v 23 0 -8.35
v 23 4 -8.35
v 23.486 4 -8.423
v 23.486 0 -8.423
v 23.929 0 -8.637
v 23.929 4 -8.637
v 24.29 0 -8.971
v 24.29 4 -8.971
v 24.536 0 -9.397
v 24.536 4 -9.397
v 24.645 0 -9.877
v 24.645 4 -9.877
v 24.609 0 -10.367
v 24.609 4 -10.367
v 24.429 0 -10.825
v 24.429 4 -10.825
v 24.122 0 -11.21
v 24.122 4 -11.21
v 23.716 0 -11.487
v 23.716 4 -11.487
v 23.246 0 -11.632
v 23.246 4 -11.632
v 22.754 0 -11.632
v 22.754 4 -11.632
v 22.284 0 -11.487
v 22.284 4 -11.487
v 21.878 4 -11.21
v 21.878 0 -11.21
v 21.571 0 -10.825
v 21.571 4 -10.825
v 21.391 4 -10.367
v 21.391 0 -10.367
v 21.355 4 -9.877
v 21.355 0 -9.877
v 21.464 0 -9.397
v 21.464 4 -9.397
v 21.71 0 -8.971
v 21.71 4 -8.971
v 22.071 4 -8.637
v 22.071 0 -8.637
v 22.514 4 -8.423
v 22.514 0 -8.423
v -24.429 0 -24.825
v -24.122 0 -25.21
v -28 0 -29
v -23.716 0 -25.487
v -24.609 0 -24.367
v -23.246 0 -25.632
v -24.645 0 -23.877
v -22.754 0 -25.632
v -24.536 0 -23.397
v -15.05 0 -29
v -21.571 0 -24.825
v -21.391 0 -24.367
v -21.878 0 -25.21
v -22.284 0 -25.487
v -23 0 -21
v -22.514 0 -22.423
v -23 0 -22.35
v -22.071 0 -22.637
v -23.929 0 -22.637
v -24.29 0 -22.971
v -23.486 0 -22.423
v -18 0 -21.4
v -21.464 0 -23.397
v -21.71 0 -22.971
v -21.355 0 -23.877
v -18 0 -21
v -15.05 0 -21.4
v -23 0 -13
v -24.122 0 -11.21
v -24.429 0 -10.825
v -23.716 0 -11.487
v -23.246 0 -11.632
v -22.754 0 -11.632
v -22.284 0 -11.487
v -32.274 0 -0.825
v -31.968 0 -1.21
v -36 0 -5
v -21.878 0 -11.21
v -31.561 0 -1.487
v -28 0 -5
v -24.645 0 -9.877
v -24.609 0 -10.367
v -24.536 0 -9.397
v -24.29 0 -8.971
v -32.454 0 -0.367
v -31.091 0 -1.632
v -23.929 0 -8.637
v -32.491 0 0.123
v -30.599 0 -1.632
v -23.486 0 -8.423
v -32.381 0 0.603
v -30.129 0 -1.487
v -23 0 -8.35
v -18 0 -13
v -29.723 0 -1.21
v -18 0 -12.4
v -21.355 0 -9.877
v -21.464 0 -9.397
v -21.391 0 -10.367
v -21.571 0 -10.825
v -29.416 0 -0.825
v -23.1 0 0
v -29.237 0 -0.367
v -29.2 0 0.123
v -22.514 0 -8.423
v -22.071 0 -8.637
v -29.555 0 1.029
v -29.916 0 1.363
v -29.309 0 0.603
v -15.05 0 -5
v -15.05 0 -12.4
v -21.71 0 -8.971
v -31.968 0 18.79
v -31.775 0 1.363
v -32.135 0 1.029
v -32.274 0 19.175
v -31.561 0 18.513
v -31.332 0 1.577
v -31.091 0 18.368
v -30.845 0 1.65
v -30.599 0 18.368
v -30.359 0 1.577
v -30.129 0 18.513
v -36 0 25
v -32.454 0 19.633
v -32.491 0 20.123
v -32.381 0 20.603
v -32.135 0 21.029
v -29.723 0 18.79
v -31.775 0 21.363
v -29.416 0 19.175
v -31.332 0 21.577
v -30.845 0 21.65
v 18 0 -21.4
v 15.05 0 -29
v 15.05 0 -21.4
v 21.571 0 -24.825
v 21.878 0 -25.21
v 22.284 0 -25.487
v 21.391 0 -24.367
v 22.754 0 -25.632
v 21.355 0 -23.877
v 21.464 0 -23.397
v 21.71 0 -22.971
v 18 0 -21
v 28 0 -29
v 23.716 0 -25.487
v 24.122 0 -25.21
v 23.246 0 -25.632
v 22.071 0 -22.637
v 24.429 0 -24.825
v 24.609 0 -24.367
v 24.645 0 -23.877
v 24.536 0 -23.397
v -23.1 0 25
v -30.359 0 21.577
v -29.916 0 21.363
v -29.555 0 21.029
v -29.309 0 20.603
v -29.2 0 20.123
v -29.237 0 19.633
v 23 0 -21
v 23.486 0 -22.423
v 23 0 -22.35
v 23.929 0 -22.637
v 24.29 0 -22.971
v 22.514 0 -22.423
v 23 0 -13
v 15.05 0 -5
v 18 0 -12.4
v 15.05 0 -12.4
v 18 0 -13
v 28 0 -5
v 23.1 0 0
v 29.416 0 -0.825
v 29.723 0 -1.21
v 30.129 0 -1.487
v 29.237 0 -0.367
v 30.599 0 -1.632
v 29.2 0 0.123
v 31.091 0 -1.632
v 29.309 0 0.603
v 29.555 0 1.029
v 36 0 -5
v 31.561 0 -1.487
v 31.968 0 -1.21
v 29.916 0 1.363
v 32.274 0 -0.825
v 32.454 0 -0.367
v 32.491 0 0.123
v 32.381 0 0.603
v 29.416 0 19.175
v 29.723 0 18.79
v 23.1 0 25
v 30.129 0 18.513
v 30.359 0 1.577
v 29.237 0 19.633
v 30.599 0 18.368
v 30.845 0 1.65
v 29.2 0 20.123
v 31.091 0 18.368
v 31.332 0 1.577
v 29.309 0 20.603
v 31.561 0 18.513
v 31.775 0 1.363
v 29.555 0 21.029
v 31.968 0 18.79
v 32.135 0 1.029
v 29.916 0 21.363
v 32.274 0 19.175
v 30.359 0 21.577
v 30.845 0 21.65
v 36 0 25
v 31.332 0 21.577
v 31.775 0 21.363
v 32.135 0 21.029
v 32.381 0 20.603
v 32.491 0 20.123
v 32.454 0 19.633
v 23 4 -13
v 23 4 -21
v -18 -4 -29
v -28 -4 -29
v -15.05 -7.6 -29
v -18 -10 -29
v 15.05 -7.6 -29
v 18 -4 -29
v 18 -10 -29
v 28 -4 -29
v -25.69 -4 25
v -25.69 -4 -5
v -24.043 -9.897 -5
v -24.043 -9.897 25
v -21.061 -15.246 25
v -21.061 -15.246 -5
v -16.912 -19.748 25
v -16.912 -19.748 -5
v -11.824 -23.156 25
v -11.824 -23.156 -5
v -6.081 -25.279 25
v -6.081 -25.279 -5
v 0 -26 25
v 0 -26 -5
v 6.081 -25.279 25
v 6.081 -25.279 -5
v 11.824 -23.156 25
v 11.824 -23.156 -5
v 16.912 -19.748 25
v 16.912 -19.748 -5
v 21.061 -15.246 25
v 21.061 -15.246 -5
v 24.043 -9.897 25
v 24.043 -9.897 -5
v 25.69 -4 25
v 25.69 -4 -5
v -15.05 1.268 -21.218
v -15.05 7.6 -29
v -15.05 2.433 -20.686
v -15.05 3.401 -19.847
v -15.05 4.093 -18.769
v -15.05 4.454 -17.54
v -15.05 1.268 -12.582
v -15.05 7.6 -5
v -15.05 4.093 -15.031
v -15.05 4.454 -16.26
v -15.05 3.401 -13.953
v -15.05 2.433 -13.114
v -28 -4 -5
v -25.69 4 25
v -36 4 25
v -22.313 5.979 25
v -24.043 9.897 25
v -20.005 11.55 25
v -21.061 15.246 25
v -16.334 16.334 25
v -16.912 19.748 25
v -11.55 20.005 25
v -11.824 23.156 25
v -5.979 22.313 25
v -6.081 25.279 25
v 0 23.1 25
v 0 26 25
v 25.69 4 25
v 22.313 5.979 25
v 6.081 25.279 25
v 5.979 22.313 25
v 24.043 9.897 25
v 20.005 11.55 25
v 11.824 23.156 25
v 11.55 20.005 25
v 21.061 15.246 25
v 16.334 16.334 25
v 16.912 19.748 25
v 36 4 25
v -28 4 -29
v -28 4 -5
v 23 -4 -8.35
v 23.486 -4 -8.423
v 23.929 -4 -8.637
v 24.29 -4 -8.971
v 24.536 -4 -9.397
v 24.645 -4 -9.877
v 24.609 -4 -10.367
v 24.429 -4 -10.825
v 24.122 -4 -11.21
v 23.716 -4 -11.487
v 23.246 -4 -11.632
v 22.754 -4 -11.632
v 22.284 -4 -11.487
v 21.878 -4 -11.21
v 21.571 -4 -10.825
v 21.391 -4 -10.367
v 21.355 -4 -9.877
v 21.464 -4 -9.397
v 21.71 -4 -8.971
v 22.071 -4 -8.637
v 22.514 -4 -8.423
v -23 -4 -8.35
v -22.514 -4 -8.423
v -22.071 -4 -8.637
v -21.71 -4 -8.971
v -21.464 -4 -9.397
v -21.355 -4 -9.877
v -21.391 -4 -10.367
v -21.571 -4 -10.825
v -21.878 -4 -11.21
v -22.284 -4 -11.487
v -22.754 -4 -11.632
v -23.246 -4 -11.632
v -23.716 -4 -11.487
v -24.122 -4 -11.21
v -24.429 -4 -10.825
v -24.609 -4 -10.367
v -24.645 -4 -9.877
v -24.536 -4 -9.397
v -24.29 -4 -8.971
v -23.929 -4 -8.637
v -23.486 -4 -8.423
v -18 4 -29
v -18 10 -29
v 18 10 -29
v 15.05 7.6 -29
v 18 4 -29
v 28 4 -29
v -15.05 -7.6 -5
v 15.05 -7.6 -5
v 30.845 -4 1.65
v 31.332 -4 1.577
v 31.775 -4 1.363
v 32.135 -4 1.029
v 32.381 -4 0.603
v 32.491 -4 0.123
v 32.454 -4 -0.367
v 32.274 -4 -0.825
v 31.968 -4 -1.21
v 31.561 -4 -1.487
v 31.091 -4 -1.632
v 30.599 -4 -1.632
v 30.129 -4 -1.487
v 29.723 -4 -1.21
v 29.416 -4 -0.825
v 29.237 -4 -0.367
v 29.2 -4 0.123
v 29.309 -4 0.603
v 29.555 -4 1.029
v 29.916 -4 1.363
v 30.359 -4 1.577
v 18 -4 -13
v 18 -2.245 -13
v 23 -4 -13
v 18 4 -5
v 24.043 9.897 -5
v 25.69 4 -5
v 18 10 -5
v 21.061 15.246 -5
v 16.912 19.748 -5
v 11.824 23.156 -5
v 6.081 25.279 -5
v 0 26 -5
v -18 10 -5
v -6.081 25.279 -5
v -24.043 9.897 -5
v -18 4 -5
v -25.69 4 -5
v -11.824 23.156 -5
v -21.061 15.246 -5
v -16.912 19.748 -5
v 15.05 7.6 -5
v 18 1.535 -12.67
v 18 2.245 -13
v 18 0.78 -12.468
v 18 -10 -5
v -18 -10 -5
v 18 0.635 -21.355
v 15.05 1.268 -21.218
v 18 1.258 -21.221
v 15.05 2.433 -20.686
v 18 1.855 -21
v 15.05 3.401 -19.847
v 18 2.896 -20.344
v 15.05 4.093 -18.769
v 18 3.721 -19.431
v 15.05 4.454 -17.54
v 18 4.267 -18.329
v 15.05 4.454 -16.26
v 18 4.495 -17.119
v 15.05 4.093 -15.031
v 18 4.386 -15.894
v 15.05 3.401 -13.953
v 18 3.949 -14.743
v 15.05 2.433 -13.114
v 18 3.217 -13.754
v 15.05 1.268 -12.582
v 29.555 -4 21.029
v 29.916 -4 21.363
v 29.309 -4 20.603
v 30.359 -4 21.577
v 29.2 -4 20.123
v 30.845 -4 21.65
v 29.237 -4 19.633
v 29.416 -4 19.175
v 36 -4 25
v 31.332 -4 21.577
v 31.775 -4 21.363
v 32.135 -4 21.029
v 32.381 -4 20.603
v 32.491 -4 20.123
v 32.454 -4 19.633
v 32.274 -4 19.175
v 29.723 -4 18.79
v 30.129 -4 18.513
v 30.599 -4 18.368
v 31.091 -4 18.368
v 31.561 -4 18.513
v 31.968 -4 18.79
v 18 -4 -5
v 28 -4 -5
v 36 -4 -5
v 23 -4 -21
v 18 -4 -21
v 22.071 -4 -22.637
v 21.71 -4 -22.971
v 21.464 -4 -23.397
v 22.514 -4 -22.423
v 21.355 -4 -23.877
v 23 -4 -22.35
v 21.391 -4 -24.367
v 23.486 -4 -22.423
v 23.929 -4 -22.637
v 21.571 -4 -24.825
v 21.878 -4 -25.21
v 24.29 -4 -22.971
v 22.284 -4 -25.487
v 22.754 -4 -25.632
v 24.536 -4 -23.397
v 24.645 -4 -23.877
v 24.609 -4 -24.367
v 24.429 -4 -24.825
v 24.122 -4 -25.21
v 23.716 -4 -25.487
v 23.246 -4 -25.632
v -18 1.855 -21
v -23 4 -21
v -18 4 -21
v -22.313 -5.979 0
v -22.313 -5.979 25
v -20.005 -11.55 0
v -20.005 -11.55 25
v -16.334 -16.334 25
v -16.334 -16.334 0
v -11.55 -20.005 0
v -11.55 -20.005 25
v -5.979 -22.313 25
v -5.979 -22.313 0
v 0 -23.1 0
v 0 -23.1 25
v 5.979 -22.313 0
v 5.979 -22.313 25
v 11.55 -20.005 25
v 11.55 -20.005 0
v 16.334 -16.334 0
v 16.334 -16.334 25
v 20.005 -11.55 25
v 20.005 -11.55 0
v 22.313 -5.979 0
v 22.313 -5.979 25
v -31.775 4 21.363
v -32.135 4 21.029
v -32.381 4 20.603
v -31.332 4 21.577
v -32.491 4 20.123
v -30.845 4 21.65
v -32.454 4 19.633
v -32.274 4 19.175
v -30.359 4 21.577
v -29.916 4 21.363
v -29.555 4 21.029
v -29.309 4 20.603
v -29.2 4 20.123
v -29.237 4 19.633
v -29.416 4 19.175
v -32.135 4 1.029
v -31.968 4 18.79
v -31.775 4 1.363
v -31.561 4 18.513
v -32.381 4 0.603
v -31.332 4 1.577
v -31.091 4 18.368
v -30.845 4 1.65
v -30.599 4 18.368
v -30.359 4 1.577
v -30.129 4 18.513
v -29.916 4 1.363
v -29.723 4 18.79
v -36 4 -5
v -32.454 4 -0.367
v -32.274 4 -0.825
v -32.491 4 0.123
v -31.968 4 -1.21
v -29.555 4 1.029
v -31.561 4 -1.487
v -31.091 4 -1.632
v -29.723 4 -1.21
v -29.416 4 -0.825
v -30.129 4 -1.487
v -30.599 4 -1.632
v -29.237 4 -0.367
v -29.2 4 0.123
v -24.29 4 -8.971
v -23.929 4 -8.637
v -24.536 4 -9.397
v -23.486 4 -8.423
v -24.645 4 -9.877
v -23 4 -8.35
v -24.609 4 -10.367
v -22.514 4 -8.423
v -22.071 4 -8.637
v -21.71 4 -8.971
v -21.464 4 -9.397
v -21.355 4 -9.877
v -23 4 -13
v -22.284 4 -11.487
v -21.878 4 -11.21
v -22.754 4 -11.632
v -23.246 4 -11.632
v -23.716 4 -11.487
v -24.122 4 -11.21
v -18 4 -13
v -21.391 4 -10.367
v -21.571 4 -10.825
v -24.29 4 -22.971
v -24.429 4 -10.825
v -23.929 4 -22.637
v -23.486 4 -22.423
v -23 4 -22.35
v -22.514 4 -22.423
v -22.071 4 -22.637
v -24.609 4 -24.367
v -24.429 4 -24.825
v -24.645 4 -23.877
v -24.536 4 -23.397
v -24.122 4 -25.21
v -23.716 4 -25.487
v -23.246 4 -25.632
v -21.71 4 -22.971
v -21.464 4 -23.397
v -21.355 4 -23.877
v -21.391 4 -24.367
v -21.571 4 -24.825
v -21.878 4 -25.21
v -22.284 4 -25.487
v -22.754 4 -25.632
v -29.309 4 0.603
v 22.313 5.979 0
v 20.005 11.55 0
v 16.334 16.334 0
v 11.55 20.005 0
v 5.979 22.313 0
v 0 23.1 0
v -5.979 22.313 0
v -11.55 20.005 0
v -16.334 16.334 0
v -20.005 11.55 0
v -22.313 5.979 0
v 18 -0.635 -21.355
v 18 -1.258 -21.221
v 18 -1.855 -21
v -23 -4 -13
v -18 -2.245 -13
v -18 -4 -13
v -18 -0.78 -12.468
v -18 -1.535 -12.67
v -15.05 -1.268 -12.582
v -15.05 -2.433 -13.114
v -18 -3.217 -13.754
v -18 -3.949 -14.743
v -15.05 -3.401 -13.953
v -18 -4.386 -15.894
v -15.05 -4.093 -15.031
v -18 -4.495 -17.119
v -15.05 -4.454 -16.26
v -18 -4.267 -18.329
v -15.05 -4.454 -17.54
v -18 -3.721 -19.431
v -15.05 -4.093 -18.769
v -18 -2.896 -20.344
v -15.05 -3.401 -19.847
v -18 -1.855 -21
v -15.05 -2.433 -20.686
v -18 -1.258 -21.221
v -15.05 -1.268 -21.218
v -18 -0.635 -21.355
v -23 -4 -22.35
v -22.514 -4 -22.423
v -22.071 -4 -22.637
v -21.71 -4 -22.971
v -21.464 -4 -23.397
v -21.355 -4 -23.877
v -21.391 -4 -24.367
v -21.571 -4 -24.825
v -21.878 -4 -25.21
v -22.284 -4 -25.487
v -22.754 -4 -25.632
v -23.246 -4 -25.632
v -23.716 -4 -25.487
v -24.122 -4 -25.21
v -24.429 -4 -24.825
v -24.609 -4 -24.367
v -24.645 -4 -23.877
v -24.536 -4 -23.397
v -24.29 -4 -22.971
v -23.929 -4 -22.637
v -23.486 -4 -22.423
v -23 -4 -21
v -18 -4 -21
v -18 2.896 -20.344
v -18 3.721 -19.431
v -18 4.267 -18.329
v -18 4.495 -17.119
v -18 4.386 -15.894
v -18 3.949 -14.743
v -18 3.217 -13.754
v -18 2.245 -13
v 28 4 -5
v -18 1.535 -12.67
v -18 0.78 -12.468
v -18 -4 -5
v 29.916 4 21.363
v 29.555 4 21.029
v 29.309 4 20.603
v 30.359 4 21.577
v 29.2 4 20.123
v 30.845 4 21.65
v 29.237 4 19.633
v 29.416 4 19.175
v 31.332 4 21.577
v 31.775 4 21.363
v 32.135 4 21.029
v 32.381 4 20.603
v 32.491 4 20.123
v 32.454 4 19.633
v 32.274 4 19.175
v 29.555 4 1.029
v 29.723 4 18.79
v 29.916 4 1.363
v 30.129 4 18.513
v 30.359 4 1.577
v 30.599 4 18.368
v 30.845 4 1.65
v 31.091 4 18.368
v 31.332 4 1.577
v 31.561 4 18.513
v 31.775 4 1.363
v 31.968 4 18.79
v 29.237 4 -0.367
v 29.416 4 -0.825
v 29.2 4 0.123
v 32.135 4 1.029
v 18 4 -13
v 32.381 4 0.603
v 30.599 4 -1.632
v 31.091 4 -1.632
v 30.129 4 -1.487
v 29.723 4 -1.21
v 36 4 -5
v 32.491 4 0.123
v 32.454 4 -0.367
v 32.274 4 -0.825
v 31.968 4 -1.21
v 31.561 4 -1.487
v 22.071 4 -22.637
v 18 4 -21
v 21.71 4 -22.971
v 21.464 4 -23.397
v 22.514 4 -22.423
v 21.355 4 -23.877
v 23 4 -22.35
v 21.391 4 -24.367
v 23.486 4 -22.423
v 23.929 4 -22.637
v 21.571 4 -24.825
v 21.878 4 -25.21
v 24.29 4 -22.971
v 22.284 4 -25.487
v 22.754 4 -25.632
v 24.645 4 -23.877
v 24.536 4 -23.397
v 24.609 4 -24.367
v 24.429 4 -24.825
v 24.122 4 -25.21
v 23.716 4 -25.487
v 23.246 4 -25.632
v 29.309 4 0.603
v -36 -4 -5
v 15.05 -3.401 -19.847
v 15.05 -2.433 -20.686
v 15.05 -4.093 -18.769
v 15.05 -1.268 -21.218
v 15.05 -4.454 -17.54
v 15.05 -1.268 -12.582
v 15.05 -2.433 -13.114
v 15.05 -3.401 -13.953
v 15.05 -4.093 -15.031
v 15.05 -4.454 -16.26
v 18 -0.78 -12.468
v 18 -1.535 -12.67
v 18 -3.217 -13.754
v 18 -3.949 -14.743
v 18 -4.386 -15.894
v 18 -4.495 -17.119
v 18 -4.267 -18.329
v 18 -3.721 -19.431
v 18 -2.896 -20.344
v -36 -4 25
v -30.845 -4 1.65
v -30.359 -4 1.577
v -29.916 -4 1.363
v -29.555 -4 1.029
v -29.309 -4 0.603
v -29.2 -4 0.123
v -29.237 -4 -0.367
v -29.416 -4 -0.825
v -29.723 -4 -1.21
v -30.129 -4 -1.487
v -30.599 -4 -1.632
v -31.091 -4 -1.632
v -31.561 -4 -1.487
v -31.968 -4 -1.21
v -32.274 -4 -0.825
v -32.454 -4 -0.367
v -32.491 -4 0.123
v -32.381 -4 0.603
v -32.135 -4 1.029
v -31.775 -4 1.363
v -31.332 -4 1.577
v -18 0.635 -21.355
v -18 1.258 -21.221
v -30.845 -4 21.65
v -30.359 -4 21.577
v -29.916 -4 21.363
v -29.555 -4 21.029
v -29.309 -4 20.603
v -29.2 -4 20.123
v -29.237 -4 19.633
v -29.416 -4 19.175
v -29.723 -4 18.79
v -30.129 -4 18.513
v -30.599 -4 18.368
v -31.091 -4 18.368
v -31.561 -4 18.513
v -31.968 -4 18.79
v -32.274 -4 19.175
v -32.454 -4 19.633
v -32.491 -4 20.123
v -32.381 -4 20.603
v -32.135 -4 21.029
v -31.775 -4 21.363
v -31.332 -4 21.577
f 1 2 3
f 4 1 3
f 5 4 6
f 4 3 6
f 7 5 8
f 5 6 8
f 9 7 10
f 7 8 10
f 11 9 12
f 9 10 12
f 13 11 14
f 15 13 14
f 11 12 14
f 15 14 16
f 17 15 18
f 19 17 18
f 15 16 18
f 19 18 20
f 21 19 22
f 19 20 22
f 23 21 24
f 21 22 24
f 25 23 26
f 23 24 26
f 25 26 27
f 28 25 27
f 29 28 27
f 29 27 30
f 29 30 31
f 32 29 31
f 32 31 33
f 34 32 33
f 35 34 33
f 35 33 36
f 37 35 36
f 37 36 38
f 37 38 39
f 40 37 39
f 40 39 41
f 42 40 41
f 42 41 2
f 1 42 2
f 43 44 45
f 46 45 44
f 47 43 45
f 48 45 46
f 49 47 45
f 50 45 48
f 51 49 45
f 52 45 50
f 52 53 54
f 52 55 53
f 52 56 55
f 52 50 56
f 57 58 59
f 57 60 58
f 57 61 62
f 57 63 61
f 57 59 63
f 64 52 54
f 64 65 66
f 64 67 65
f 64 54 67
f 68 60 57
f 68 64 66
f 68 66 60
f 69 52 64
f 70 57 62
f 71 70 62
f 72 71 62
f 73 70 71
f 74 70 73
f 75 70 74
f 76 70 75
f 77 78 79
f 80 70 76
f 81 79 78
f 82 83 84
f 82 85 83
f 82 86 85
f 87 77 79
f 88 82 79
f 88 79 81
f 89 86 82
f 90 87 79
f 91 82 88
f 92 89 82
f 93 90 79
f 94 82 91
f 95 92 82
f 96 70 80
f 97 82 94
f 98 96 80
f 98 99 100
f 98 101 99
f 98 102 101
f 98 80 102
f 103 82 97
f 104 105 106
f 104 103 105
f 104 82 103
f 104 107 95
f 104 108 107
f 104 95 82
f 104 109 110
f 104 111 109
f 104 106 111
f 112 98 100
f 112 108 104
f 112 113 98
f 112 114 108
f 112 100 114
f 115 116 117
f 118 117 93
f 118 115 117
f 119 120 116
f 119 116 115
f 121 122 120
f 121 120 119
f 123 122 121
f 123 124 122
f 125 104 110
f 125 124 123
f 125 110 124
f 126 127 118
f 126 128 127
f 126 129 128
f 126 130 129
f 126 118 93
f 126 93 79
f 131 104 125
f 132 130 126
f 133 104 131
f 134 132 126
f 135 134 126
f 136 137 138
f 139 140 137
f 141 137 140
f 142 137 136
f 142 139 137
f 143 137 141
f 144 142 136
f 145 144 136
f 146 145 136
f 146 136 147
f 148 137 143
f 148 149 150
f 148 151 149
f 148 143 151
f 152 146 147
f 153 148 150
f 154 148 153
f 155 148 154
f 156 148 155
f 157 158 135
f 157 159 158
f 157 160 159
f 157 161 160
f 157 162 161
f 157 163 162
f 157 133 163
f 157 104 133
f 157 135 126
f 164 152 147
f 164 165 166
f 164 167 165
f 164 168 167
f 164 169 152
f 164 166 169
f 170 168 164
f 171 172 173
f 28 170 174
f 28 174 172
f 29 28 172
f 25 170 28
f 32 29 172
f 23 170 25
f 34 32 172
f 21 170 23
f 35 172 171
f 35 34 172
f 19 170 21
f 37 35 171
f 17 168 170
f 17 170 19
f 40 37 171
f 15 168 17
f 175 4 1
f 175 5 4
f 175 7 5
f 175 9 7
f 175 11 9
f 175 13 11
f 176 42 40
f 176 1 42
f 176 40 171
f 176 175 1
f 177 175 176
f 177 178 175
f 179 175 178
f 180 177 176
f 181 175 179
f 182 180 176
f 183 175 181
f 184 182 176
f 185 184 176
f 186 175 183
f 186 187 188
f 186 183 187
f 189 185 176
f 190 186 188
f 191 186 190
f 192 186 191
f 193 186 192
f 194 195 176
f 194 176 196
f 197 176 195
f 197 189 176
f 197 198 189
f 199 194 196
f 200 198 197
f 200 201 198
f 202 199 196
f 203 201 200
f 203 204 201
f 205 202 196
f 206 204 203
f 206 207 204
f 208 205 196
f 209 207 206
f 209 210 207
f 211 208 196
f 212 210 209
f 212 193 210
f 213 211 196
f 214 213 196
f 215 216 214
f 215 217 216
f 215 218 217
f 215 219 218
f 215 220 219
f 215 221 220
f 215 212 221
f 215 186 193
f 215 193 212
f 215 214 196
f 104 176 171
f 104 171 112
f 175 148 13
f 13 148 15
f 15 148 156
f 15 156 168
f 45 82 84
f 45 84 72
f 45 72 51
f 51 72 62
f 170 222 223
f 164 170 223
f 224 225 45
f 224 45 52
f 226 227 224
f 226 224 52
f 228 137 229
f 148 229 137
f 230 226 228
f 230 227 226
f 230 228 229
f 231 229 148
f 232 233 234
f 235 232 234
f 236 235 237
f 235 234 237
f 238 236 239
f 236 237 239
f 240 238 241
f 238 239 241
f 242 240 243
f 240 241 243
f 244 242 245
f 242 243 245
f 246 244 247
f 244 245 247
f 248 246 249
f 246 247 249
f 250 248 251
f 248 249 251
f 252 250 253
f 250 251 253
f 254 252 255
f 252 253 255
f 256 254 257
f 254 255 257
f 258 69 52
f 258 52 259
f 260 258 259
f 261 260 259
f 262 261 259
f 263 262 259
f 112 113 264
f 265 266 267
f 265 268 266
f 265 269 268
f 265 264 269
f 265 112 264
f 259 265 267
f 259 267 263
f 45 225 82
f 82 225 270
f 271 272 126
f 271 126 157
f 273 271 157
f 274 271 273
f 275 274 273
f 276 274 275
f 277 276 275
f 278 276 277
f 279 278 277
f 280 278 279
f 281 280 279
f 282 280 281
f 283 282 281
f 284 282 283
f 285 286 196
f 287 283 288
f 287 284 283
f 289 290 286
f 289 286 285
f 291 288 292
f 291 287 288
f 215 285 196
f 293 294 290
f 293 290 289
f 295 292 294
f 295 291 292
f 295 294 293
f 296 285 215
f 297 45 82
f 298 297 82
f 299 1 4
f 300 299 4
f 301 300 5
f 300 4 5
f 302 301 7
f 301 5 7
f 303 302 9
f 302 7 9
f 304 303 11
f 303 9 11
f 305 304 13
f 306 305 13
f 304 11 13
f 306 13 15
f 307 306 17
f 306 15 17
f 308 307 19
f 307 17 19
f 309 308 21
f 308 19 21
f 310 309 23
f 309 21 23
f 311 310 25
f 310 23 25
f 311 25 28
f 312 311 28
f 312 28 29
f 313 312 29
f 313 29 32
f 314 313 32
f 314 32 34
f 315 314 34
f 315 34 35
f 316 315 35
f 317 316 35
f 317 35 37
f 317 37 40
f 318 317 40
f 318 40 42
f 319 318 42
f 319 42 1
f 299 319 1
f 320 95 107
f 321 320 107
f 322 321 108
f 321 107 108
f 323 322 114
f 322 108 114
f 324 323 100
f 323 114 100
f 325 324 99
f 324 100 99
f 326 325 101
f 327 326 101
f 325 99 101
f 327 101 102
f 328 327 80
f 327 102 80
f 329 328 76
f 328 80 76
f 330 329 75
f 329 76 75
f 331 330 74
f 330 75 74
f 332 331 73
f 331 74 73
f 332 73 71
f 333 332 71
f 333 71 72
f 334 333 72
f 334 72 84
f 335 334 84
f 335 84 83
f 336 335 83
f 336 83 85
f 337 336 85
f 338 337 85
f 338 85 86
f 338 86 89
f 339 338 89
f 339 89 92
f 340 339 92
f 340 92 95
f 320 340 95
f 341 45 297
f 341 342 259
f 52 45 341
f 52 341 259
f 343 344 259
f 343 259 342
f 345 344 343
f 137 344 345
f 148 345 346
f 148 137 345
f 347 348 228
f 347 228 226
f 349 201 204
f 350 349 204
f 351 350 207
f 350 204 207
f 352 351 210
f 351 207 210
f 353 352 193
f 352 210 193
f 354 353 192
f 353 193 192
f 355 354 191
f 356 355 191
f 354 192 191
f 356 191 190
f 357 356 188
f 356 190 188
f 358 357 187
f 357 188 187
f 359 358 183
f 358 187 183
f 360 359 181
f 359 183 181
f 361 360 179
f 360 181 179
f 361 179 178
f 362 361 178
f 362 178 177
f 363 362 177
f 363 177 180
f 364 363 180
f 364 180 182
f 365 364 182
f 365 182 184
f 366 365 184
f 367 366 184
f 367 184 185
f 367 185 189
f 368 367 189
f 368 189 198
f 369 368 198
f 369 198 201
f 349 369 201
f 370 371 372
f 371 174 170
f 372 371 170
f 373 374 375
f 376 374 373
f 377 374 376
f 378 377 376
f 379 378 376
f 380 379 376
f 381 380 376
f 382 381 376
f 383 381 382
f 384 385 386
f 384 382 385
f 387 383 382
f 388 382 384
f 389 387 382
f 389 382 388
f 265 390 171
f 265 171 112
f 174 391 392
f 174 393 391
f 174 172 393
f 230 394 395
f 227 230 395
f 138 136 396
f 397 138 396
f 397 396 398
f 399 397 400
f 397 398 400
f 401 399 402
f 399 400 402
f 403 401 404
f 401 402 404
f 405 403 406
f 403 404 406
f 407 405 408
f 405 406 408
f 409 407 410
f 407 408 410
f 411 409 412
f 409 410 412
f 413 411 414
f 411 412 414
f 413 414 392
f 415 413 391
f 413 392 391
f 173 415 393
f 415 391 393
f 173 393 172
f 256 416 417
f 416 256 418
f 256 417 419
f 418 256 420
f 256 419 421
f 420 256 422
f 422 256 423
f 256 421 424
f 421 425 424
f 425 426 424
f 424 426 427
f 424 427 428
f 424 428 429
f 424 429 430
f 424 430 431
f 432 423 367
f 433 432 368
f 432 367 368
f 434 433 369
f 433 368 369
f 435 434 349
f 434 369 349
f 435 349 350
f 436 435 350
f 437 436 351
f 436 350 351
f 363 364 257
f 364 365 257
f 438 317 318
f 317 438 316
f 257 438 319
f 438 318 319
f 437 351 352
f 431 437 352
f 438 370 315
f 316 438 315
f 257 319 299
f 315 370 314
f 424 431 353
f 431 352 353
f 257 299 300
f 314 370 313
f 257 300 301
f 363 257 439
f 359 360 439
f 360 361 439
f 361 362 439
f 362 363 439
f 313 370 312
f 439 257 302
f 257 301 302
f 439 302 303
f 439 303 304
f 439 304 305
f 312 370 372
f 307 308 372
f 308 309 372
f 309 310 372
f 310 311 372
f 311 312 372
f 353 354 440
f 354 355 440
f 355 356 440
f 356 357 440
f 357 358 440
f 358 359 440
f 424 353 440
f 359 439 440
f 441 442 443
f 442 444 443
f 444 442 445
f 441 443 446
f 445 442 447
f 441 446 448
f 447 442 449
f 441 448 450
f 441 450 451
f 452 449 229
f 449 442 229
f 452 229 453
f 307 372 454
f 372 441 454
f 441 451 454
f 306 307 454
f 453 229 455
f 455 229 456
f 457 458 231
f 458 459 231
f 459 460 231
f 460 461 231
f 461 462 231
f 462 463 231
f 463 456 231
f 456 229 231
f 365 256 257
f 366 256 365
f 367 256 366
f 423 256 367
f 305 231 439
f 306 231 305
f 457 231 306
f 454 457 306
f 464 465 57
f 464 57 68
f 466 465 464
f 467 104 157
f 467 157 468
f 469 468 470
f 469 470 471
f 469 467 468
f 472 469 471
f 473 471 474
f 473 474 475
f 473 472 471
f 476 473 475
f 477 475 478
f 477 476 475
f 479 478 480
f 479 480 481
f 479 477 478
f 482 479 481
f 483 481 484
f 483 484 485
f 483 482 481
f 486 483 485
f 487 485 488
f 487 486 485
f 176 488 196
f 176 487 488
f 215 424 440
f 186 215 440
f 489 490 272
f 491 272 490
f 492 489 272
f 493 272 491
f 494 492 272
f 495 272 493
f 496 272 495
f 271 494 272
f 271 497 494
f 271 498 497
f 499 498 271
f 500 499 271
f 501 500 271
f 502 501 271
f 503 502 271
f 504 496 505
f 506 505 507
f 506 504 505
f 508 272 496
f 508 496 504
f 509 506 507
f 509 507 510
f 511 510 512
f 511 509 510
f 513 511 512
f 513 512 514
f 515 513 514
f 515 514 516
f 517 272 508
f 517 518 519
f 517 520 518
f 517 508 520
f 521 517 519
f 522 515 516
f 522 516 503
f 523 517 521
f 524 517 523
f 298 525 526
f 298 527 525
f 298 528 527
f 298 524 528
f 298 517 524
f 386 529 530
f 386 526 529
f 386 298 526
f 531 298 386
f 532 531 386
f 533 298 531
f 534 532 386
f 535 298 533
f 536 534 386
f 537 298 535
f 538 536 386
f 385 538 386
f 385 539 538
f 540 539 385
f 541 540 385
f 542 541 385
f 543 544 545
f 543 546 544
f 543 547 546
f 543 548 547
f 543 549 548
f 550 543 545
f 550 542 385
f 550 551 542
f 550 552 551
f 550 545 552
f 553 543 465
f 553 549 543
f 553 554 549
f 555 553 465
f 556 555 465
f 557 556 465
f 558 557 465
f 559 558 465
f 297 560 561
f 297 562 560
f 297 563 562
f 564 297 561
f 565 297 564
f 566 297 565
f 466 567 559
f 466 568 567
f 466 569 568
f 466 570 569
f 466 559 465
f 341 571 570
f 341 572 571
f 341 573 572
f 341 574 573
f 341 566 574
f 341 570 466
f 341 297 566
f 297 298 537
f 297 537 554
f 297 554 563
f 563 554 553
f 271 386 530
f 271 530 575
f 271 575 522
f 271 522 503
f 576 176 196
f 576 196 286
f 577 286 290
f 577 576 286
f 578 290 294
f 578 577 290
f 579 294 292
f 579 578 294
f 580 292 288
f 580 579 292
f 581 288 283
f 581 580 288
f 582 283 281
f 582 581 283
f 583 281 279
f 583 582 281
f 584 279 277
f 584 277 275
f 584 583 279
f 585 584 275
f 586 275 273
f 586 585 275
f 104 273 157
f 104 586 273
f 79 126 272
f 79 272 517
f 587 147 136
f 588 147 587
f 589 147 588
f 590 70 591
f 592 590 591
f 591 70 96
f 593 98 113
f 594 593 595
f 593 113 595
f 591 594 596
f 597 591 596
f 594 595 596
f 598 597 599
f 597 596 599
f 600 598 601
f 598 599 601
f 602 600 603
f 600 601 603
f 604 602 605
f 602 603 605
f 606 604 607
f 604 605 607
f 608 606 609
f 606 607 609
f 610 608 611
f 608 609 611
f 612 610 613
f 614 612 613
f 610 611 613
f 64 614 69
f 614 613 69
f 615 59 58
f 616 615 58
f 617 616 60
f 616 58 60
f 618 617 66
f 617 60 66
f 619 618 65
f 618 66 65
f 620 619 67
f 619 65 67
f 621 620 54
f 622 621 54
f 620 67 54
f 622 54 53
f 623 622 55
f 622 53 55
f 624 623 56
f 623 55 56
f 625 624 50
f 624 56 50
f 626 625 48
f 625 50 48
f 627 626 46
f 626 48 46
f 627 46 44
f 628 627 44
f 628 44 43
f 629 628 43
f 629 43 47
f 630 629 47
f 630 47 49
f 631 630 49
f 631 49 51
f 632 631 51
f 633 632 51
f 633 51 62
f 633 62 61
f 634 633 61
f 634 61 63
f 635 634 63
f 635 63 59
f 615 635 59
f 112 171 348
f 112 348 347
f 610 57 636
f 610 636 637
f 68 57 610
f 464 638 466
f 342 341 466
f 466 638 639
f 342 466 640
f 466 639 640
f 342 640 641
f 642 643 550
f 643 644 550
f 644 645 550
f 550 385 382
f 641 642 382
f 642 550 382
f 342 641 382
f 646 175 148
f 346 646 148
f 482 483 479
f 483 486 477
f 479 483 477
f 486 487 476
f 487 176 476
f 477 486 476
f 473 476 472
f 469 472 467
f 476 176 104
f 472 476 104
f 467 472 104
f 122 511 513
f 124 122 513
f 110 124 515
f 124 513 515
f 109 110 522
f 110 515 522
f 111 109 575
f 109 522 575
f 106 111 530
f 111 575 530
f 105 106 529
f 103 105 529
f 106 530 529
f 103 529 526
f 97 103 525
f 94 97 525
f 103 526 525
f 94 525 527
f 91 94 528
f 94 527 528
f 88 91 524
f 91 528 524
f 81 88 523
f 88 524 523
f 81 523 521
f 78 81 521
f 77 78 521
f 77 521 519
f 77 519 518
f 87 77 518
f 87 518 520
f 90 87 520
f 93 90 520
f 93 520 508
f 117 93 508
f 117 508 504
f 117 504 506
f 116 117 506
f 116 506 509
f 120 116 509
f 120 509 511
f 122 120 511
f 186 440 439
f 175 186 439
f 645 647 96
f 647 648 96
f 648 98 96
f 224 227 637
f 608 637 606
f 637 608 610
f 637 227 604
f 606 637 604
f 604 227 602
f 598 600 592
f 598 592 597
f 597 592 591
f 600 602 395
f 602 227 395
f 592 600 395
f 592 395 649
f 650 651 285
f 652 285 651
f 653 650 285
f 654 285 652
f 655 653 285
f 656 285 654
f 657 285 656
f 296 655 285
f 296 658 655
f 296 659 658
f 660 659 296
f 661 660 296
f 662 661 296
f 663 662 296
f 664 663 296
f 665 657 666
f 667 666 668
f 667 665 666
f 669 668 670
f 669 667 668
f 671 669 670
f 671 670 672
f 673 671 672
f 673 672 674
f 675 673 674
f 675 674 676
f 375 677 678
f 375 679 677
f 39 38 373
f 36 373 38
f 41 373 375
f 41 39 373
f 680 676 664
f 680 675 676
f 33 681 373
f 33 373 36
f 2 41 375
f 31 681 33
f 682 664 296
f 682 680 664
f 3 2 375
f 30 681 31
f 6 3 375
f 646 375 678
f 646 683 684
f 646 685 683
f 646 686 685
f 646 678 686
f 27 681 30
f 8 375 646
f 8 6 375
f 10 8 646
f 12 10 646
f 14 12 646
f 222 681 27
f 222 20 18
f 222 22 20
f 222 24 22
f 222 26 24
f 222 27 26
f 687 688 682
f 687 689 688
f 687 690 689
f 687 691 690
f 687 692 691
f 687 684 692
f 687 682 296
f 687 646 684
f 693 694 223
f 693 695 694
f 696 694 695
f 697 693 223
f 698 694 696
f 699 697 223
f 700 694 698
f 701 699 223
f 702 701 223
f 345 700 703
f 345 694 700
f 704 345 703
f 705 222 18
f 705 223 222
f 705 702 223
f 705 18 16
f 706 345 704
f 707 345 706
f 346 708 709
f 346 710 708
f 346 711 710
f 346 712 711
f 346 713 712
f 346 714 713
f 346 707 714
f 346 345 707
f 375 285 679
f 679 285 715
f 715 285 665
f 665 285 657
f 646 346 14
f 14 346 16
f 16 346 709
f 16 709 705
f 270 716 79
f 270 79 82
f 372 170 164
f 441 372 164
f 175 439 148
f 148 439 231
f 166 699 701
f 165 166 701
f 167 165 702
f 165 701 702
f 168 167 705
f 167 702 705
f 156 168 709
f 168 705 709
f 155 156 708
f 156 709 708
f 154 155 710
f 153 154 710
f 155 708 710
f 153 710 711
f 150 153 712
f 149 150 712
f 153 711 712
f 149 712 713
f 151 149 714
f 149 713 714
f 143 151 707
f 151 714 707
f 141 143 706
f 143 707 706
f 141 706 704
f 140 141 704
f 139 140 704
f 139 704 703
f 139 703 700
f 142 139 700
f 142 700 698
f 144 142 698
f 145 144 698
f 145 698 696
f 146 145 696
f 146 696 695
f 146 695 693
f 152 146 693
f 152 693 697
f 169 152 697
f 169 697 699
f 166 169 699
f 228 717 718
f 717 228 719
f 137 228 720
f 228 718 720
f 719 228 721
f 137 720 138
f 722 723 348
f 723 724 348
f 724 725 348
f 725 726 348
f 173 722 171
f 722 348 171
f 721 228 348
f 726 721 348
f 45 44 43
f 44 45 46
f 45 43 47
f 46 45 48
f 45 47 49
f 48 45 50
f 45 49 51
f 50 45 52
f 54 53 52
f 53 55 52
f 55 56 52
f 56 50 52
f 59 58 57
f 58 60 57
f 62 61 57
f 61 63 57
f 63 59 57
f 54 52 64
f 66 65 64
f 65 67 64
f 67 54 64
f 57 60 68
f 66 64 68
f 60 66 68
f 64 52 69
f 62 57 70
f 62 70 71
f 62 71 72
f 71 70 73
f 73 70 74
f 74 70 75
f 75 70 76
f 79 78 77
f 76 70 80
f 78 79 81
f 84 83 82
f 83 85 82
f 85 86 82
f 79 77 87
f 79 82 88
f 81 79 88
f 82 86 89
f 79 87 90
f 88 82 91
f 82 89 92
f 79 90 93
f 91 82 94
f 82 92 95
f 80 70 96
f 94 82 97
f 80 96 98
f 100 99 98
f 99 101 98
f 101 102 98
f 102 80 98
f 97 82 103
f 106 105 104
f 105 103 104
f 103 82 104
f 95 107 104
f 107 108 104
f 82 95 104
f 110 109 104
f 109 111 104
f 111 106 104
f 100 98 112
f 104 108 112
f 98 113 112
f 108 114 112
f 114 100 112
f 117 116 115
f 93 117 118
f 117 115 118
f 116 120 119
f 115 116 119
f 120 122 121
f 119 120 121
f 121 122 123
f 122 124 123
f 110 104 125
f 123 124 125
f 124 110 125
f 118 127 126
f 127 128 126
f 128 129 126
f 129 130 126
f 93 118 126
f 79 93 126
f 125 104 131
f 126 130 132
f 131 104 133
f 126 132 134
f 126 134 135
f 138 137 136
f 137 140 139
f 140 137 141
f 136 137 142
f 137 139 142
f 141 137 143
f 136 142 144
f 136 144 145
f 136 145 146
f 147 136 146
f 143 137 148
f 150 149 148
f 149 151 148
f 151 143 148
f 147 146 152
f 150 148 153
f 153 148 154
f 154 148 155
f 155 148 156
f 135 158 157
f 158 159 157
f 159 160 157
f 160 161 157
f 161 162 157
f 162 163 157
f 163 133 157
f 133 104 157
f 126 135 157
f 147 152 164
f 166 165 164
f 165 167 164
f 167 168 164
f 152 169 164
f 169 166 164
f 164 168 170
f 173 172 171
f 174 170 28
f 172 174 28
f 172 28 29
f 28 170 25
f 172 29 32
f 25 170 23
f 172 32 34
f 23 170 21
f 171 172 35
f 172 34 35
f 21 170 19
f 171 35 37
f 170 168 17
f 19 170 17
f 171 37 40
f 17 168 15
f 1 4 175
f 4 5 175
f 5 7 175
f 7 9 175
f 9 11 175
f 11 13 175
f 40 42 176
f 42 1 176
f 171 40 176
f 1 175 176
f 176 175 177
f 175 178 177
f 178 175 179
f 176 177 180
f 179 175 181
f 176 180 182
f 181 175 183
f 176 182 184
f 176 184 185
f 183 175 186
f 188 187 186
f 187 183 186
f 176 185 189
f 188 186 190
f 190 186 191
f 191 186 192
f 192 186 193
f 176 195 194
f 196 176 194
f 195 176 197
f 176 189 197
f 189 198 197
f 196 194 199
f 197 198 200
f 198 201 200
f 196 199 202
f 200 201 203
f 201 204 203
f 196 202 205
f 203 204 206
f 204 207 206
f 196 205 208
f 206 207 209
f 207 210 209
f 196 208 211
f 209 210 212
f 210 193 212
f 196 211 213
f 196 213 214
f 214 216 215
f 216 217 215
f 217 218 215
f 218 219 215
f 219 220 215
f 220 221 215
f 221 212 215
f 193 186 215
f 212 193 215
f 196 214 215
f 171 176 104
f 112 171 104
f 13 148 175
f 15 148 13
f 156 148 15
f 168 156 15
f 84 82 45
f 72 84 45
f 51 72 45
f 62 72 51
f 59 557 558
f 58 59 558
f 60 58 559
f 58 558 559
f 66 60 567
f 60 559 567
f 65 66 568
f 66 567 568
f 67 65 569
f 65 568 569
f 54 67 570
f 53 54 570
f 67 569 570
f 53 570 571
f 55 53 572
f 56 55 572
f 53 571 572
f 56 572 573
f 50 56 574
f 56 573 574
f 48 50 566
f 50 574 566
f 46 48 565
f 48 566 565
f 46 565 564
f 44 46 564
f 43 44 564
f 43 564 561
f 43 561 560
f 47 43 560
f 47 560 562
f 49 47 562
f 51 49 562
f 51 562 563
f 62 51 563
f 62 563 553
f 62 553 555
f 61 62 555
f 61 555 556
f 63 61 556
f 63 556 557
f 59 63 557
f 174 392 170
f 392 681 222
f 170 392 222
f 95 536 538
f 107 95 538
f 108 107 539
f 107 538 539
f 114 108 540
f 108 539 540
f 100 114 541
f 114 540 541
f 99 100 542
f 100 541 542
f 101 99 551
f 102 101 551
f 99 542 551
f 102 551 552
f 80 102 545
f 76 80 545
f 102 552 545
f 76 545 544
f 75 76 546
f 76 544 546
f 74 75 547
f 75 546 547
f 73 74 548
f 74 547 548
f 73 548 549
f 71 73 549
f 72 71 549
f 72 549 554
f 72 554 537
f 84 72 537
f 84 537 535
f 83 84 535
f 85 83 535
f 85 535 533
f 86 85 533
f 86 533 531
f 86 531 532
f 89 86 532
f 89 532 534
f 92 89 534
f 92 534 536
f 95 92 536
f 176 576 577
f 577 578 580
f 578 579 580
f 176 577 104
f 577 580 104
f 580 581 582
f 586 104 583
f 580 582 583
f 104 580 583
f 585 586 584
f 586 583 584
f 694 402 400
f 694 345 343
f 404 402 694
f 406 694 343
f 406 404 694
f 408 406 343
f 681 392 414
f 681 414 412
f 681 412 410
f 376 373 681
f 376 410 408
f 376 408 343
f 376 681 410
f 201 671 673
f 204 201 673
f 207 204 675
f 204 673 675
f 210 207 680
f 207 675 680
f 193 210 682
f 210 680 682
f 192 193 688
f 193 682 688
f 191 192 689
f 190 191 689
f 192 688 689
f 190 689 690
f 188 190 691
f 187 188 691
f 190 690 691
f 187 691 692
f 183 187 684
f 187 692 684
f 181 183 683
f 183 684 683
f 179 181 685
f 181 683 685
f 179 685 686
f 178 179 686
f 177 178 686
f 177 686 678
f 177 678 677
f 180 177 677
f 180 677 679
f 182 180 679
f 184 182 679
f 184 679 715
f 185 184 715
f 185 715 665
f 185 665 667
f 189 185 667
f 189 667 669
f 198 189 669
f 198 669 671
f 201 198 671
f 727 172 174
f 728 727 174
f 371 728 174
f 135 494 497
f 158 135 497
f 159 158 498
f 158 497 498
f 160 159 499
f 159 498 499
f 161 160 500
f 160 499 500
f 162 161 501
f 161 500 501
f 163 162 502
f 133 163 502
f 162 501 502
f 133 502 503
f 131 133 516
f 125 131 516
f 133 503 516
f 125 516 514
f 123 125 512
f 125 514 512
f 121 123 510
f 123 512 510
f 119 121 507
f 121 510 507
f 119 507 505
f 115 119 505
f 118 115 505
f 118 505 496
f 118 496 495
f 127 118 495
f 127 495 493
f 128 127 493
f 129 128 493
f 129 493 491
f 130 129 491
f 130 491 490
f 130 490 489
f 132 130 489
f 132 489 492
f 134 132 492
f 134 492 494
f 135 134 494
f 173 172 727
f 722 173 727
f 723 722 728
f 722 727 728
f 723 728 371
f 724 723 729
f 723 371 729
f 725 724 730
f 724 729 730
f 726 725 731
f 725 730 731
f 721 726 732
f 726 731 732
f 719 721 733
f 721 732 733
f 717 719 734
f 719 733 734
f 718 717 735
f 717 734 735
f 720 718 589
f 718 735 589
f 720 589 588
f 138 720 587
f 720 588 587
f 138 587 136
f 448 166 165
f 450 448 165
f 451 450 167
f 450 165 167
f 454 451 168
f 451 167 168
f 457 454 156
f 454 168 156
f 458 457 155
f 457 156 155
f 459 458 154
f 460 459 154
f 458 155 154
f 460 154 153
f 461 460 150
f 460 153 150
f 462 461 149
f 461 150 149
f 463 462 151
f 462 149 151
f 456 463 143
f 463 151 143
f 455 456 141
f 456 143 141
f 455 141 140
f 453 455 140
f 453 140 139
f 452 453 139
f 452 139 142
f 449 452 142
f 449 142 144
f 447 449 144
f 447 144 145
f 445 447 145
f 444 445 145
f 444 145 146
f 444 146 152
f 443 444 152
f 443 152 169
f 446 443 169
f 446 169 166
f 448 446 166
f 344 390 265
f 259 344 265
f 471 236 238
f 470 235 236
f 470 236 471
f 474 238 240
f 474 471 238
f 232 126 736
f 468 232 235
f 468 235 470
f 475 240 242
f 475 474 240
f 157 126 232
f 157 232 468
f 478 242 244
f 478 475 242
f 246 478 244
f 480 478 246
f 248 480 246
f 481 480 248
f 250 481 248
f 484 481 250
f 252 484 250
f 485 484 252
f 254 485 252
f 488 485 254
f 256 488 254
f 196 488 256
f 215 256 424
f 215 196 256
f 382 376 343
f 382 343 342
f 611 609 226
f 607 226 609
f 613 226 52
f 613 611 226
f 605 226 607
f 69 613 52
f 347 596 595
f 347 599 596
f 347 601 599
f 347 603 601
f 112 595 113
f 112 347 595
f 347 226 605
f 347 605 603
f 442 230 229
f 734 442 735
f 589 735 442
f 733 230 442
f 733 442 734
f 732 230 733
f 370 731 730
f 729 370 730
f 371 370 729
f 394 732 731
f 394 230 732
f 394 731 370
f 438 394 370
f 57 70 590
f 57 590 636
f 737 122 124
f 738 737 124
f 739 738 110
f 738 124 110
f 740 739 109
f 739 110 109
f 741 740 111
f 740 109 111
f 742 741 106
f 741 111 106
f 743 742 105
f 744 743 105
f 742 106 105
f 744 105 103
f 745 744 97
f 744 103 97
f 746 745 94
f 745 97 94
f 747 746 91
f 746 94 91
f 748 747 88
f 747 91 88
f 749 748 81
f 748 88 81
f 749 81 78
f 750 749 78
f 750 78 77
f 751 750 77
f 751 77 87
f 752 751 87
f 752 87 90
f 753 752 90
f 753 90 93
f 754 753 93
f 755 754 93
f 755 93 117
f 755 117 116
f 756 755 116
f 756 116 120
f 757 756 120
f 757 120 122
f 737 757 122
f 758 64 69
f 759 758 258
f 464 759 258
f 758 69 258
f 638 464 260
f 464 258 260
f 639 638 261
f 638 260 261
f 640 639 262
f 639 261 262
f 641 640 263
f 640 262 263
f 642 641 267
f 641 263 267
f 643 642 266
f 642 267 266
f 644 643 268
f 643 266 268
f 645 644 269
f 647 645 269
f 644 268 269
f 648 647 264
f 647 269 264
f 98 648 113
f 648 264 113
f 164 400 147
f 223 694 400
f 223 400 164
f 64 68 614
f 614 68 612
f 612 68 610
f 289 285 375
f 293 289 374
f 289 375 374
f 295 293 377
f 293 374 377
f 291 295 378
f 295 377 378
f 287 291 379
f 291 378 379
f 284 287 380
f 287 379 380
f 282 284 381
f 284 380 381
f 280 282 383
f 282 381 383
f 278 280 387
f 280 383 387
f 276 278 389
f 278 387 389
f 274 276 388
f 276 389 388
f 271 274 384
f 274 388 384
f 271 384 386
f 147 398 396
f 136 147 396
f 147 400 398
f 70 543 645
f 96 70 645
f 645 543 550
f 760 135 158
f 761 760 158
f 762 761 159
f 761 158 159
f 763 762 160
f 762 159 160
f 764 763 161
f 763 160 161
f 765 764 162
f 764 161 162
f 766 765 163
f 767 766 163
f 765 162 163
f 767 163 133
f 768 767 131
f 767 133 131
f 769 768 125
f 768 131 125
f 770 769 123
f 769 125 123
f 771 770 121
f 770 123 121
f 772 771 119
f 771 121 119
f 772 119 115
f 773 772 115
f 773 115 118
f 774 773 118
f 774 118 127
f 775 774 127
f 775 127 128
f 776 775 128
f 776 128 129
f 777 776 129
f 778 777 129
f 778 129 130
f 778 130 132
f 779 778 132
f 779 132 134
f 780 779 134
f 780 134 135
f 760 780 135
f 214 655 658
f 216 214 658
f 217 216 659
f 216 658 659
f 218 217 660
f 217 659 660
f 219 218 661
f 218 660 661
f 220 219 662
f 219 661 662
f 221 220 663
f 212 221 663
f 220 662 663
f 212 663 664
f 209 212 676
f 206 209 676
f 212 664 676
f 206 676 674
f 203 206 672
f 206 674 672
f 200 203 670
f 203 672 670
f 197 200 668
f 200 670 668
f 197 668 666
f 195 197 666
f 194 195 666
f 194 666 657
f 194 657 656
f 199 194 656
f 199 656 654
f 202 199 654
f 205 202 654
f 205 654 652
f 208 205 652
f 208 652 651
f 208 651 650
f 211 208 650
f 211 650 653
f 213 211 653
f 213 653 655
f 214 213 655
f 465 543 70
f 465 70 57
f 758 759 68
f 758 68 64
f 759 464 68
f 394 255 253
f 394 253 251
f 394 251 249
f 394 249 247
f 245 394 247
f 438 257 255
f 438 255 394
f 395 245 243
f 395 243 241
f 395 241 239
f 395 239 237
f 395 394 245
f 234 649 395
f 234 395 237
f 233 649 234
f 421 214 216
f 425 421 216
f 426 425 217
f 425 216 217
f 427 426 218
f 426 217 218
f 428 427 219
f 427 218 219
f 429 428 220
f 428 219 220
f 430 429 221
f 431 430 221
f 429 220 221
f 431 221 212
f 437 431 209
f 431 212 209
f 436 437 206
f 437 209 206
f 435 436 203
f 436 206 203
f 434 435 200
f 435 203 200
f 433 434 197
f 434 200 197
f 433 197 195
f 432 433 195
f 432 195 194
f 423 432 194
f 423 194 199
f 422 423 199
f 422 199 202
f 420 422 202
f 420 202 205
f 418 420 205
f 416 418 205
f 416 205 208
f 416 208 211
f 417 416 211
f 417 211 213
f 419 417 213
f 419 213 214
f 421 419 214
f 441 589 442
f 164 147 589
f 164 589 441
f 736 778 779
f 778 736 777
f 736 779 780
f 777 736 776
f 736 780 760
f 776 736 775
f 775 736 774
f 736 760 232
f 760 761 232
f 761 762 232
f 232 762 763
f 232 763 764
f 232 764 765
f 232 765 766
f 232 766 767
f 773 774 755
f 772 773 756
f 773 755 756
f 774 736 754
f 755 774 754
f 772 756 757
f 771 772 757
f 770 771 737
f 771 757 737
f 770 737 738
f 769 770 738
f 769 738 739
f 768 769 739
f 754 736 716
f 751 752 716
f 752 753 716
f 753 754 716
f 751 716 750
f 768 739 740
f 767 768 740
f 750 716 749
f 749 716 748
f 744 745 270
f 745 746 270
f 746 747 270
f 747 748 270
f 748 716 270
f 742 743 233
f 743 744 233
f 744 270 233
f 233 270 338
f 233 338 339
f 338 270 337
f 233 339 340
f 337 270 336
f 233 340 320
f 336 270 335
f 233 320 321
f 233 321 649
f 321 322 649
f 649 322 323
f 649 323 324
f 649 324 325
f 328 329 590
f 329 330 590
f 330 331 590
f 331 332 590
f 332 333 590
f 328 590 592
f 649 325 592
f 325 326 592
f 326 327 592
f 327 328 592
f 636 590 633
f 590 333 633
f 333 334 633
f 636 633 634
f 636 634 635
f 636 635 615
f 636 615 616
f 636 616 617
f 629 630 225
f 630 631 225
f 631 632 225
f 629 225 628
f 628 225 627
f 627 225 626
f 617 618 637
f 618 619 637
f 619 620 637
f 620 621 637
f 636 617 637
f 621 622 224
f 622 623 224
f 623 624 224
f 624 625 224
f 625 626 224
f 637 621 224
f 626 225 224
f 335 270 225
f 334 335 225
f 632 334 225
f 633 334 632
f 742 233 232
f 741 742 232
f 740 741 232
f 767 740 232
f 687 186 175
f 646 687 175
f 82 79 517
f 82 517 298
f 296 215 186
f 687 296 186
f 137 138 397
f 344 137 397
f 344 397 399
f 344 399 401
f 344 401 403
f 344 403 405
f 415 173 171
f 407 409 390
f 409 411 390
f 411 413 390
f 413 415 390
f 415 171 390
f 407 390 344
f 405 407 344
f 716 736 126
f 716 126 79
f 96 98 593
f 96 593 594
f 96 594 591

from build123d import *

# Parameters (mm, degrees)
SKETCH_1_R           = 26
SKETCH_1_R_2         = 23.1
EXTRUDE_1_DEPTH      = 25
EXTRUDE_START        = 5
SKETCH_2_R           = 26
EXTRUDE_2_DEPTH      = 5
SKETCH_3_W           = 36
SKETCH_3_H           = 20
SKETCH_3_W_2         = 30.1
SKETCH_3_H_2         = 15.2
EXTRUDE_3_DEPTH      = 24
CUT_EXTRUDE_1_REACH  = 60.762
SKETCH_4_R           = 4.5
EXTRUDE_4_DEPTH      = 4
EXTRUDE_4_DEPTH_BACK = 4
SKETCH_5_W           = 10
SKETCH_5_H           = 24
SKETCH_5_W_2         = 11
SKETCH_5_H_2         = 30
CUT_EXTRUDE_2_REACH  = 57.109
SKETCH_6_R           = 1.65
SKETCH_6_W           = 5
SKETCH_6_H           = 8


with BuildPart() as part:
    # ｽｹｯﾁ1 → ﾎﾞｽ - 押し出し1 (new body)
    with BuildSketch(Plane.XY):
        Circle(SKETCH_1_R)
        Circle(SKETCH_1_R_2, mode=Mode.SUBTRACT)
    extrude(amount=EXTRUDE_1_DEPTH)

    # ｽｹｯﾁ2 → ﾎﾞｽ - 押し出し2 (add)
    with BuildSketch(Plane(origin=(0, 0, 0), x_dir=(-1, 0, 0), z_dir=(0, 0, -1)).offset(EXTRUDE_START)):
        Circle(SKETCH_2_R)
    extrude(amount=-EXTRUDE_2_DEPTH)

    # ｽｹｯﾁ3 → ﾎﾞｽ - 押し出し3 (add)
    with BuildSketch(Plane(origin=(0, 0, -5), x_dir=(-1, 0, 0), z_dir=(0, 0, -1))):
        Rectangle(SKETCH_3_W, SKETCH_3_H)
        Rectangle(SKETCH_3_W_2, SKETCH_3_H_2, mode=Mode.SUBTRACT)
    extrude(amount=EXTRUDE_3_DEPTH)

    # ｶｯﾄ - 押し出し1: up to this face of the body (flat: up to its plane)
    cut_extrude_1_end = Plane(part.part.faces().sort_by_distance((-18, 0, -17))[0])
    # ｽｹｯﾁ4 → ｶｯﾄ - 押し出し1 (cut, up to the picked face)
    with BuildSketch(Plane(origin=(18, 0, 0), x_dir=(0, 0, -1), z_dir=(1, 0, 0)), mode=Mode.PRIVATE) as cut_extrude_1_sk1:
        with Locations((16.9, 0)):
            Circle(SKETCH_4_R)
    cut_extrude_1_tool1 = split(extrude(cut_extrude_1_sk1.sketch, amount=-CUT_EXTRUDE_1_REACH, mode=Mode.PRIVATE), bisect_by=cut_extrude_1_end, keep=Keep.BOTH, mode=Mode.PRIVATE)
    add(cut_extrude_1_tool1.solids().sort_by(Axis((18, 0, -16.9), (-1, 0, 0)))[0], mode=Mode.SUBTRACT)

    # ｽｹｯﾁ5 → ﾎﾞｽ - 押し出し4 (add, two sides: drawn at the far end of the back side and taken through both)
    with BuildSketch(Plane(origin=(0, 0, 0), x_dir=(1, 0, 0), z_dir=(0, 1, 0)).offset(-EXTRUDE_4_DEPTH_BACK)):
        Polygon((28, 5), (25, 5), (25, -25), (36, -25), (36, 5), align=None)
        with Locations((23, 17)):
            Rectangle(SKETCH_5_W, SKETCH_5_H)
        Polygon((-28, 29), (-28, 5), (-25, 5), (-18, 5), (-18, 29), align=None)
        with Locations((-30.5, -10)):
            Rectangle(SKETCH_5_W_2, SKETCH_5_H_2)
    extrude(amount=EXTRUDE_4_DEPTH + EXTRUDE_4_DEPTH_BACK)

    # ｽｹｯﾁ6 → ｶｯﾄ - 押し出し2 (cut, up to next)
    with BuildSketch(Plane(origin=(0, 4, 0), x_dir=(1, 0, 0), z_dir=(0, 1, 0)), mode=Mode.PRIVATE) as cut_extrude_2_sk1:
        with Locations(Location((23, 24, 0), (0, 0, 270))):
            Circle(SKETCH_6_R)
    cut_extrude_2_tool1 = extrude(cut_extrude_2_sk1.sketch, amount=-CUT_EXTRUDE_2_REACH, mode=Mode.PRIVATE) & part.part
    # ｽｹｯﾁ6 → ｶｯﾄ - 押し出し2 (cut, up to next)
    with BuildSketch(Plane(origin=(0, 4, 0), x_dir=(1, 0, 0), z_dir=(0, 1, 0)), mode=Mode.PRIVATE) as cut_extrude_2_sk2:
        with Locations(Location((23, 10, 0), (0, 0, 270))):
            Circle(SKETCH_6_R)
    cut_extrude_2_tool2 = extrude(cut_extrude_2_sk2.sketch, amount=-CUT_EXTRUDE_2_REACH, mode=Mode.PRIVATE) & part.part
    # ｽｹｯﾁ6 → ｶｯﾄ - 押し出し2 (cut, up to next)
    with BuildSketch(Plane(origin=(0, 4, 0), x_dir=(1, 0, 0), z_dir=(0, 1, 0)), mode=Mode.PRIVATE) as cut_extrude_2_sk3:
        with Locations(Location((30.845232579, 0, 0), (0, 0, 270))):
            Circle(SKETCH_6_R)
    cut_extrude_2_tool3 = extrude(cut_extrude_2_sk3.sketch, amount=-CUT_EXTRUDE_2_REACH, mode=Mode.PRIVATE) & part.part
    # ｽｹｯﾁ6 → ｶｯﾄ - 押し出し2 (cut, up to next)
    with BuildSketch(Plane(origin=(0, 4, 0), x_dir=(1, 0, 0), z_dir=(0, 1, 0)), mode=Mode.PRIVATE) as cut_extrude_2_sk4:
        with Locations(Location((30.845232579, -20, 0), (0, 0, 270))):
            Circle(SKETCH_6_R)
    cut_extrude_2_tool4 = extrude(cut_extrude_2_sk4.sketch, amount=-CUT_EXTRUDE_2_REACH, mode=Mode.PRIVATE) & part.part
    # ｽｹｯﾁ6 → ｶｯﾄ - 押し出し2 (cut, up to next)
    with BuildSketch(Plane(origin=(0, 4, 0), x_dir=(1, 0, 0), z_dir=(0, 1, 0)), mode=Mode.PRIVATE) as cut_extrude_2_sk5:
        with Locations(Location((-30.845232579, -20, 0), (0, 0, 270))):
            Circle(SKETCH_6_R)
    cut_extrude_2_tool5 = extrude(cut_extrude_2_sk5.sketch, amount=-CUT_EXTRUDE_2_REACH, mode=Mode.PRIVATE) & part.part
    # ｽｹｯﾁ6 → ｶｯﾄ - 押し出し2 (cut, up to next)
    with BuildSketch(Plane(origin=(0, 4, 0), x_dir=(1, 0, 0), z_dir=(0, 1, 0)), mode=Mode.PRIVATE) as cut_extrude_2_sk6:
        with Locations(Location((-30.845232579, 0, 0), (0, 0, 270))):
            Circle(SKETCH_6_R)
    cut_extrude_2_tool6 = extrude(cut_extrude_2_sk6.sketch, amount=-CUT_EXTRUDE_2_REACH, mode=Mode.PRIVATE) & part.part
    # ｽｹｯﾁ6 → ｶｯﾄ - 押し出し2 (cut, up to next)
    with BuildSketch(Plane(origin=(0, 4, 0), x_dir=(1, 0, 0), z_dir=(0, 1, 0)), mode=Mode.PRIVATE) as cut_extrude_2_sk7:
        with Locations(Location((-23, 10, 0), (0, 0, 270))):
            Circle(SKETCH_6_R)
    cut_extrude_2_tool7 = extrude(cut_extrude_2_sk7.sketch, amount=-CUT_EXTRUDE_2_REACH, mode=Mode.PRIVATE) & part.part
    # ｽｹｯﾁ6 → ｶｯﾄ - 押し出し2 (cut, up to next)
    with BuildSketch(Plane(origin=(0, 4, 0), x_dir=(1, 0, 0), z_dir=(0, 1, 0)), mode=Mode.PRIVATE) as cut_extrude_2_sk8:
        with Locations(Location((-23, 24, 0), (0, 0, 270))):
            Circle(SKETCH_6_R)
    cut_extrude_2_tool8 = extrude(cut_extrude_2_sk8.sketch, amount=-CUT_EXTRUDE_2_REACH, mode=Mode.PRIVATE) & part.part
    # ｽｹｯﾁ6 → ｶｯﾄ - 押し出し2 (cut, up to next)
    with BuildSketch(Plane(origin=(0, 4, 0), x_dir=(1, 0, 0), z_dir=(0, 1, 0)), mode=Mode.PRIVATE) as cut_extrude_2_sk9:
        with Locations((20.5, 17)):
            Rectangle(SKETCH_6_W, SKETCH_6_H)
    cut_extrude_2_tool9 = extrude(cut_extrude_2_sk9.sketch, amount=-CUT_EXTRUDE_2_REACH, mode=Mode.PRIVATE) & part.part
    # ｽｹｯﾁ6 → ｶｯﾄ - 押し出し2 (cut, up to next)
    with BuildSketch(Plane(origin=(0, 4, 0), x_dir=(1, 0, 0), z_dir=(0, 1, 0)), mode=Mode.PRIVATE) as cut_extrude_2_sk10:
        with Locations((-20.5, 17)):
            Rectangle(SKETCH_6_W, SKETCH_6_H)
    cut_extrude_2_tool10 = extrude(cut_extrude_2_sk10.sketch, amount=-CUT_EXTRUDE_2_REACH, mode=Mode.PRIVATE) & part.part
    add(cut_extrude_2_tool1.solids().sort_by_distance((23, 4, -24))[0], mode=Mode.SUBTRACT)
    add(cut_extrude_2_tool2.solids().sort_by_distance((23, 4, -10))[0], mode=Mode.SUBTRACT)
    add(cut_extrude_2_tool3.solids().sort_by_distance((30.845233, 4, 0))[0], mode=Mode.SUBTRACT)
    add(cut_extrude_2_tool4.solids().sort_by_distance((30.845233, 4, 20))[0], mode=Mode.SUBTRACT)
    add(cut_extrude_2_tool5.solids().sort_by_distance((-30.845233, 4, 20))[0], mode=Mode.SUBTRACT)
    add(cut_extrude_2_tool6.solids().sort_by_distance((-30.845233, 4, 0))[0], mode=Mode.SUBTRACT)
    add(cut_extrude_2_tool7.solids().sort_by_distance((-23, 4, -10))[0], mode=Mode.SUBTRACT)
    add(cut_extrude_2_tool8.solids().sort_by_distance((-23, 4, -24))[0], mode=Mode.SUBTRACT)
    add(cut_extrude_2_tool9.solids().sort_by_distance((20.5, 4, -17))[0], mode=Mode.SUBTRACT)
    add(cut_extrude_2_tool10.solids().sort_by_distance((-20.5, 4, -17))[0], mode=Mode.SUBTRACT)


with BuildPart() as body_2:
    # Split Bodies 1: the piece on the far side of the plane
    add(part.part)
    split(bisect_by=Plane.ZX, keep=Keep.BOTTOM)


with BuildPart() as part_1:
    add(part.part)

    # Split Bodies 1
    split(bisect_by=Plane.ZX, keep=Keep.TOP)


solid = Compound([body_2.part, part_1.part])
